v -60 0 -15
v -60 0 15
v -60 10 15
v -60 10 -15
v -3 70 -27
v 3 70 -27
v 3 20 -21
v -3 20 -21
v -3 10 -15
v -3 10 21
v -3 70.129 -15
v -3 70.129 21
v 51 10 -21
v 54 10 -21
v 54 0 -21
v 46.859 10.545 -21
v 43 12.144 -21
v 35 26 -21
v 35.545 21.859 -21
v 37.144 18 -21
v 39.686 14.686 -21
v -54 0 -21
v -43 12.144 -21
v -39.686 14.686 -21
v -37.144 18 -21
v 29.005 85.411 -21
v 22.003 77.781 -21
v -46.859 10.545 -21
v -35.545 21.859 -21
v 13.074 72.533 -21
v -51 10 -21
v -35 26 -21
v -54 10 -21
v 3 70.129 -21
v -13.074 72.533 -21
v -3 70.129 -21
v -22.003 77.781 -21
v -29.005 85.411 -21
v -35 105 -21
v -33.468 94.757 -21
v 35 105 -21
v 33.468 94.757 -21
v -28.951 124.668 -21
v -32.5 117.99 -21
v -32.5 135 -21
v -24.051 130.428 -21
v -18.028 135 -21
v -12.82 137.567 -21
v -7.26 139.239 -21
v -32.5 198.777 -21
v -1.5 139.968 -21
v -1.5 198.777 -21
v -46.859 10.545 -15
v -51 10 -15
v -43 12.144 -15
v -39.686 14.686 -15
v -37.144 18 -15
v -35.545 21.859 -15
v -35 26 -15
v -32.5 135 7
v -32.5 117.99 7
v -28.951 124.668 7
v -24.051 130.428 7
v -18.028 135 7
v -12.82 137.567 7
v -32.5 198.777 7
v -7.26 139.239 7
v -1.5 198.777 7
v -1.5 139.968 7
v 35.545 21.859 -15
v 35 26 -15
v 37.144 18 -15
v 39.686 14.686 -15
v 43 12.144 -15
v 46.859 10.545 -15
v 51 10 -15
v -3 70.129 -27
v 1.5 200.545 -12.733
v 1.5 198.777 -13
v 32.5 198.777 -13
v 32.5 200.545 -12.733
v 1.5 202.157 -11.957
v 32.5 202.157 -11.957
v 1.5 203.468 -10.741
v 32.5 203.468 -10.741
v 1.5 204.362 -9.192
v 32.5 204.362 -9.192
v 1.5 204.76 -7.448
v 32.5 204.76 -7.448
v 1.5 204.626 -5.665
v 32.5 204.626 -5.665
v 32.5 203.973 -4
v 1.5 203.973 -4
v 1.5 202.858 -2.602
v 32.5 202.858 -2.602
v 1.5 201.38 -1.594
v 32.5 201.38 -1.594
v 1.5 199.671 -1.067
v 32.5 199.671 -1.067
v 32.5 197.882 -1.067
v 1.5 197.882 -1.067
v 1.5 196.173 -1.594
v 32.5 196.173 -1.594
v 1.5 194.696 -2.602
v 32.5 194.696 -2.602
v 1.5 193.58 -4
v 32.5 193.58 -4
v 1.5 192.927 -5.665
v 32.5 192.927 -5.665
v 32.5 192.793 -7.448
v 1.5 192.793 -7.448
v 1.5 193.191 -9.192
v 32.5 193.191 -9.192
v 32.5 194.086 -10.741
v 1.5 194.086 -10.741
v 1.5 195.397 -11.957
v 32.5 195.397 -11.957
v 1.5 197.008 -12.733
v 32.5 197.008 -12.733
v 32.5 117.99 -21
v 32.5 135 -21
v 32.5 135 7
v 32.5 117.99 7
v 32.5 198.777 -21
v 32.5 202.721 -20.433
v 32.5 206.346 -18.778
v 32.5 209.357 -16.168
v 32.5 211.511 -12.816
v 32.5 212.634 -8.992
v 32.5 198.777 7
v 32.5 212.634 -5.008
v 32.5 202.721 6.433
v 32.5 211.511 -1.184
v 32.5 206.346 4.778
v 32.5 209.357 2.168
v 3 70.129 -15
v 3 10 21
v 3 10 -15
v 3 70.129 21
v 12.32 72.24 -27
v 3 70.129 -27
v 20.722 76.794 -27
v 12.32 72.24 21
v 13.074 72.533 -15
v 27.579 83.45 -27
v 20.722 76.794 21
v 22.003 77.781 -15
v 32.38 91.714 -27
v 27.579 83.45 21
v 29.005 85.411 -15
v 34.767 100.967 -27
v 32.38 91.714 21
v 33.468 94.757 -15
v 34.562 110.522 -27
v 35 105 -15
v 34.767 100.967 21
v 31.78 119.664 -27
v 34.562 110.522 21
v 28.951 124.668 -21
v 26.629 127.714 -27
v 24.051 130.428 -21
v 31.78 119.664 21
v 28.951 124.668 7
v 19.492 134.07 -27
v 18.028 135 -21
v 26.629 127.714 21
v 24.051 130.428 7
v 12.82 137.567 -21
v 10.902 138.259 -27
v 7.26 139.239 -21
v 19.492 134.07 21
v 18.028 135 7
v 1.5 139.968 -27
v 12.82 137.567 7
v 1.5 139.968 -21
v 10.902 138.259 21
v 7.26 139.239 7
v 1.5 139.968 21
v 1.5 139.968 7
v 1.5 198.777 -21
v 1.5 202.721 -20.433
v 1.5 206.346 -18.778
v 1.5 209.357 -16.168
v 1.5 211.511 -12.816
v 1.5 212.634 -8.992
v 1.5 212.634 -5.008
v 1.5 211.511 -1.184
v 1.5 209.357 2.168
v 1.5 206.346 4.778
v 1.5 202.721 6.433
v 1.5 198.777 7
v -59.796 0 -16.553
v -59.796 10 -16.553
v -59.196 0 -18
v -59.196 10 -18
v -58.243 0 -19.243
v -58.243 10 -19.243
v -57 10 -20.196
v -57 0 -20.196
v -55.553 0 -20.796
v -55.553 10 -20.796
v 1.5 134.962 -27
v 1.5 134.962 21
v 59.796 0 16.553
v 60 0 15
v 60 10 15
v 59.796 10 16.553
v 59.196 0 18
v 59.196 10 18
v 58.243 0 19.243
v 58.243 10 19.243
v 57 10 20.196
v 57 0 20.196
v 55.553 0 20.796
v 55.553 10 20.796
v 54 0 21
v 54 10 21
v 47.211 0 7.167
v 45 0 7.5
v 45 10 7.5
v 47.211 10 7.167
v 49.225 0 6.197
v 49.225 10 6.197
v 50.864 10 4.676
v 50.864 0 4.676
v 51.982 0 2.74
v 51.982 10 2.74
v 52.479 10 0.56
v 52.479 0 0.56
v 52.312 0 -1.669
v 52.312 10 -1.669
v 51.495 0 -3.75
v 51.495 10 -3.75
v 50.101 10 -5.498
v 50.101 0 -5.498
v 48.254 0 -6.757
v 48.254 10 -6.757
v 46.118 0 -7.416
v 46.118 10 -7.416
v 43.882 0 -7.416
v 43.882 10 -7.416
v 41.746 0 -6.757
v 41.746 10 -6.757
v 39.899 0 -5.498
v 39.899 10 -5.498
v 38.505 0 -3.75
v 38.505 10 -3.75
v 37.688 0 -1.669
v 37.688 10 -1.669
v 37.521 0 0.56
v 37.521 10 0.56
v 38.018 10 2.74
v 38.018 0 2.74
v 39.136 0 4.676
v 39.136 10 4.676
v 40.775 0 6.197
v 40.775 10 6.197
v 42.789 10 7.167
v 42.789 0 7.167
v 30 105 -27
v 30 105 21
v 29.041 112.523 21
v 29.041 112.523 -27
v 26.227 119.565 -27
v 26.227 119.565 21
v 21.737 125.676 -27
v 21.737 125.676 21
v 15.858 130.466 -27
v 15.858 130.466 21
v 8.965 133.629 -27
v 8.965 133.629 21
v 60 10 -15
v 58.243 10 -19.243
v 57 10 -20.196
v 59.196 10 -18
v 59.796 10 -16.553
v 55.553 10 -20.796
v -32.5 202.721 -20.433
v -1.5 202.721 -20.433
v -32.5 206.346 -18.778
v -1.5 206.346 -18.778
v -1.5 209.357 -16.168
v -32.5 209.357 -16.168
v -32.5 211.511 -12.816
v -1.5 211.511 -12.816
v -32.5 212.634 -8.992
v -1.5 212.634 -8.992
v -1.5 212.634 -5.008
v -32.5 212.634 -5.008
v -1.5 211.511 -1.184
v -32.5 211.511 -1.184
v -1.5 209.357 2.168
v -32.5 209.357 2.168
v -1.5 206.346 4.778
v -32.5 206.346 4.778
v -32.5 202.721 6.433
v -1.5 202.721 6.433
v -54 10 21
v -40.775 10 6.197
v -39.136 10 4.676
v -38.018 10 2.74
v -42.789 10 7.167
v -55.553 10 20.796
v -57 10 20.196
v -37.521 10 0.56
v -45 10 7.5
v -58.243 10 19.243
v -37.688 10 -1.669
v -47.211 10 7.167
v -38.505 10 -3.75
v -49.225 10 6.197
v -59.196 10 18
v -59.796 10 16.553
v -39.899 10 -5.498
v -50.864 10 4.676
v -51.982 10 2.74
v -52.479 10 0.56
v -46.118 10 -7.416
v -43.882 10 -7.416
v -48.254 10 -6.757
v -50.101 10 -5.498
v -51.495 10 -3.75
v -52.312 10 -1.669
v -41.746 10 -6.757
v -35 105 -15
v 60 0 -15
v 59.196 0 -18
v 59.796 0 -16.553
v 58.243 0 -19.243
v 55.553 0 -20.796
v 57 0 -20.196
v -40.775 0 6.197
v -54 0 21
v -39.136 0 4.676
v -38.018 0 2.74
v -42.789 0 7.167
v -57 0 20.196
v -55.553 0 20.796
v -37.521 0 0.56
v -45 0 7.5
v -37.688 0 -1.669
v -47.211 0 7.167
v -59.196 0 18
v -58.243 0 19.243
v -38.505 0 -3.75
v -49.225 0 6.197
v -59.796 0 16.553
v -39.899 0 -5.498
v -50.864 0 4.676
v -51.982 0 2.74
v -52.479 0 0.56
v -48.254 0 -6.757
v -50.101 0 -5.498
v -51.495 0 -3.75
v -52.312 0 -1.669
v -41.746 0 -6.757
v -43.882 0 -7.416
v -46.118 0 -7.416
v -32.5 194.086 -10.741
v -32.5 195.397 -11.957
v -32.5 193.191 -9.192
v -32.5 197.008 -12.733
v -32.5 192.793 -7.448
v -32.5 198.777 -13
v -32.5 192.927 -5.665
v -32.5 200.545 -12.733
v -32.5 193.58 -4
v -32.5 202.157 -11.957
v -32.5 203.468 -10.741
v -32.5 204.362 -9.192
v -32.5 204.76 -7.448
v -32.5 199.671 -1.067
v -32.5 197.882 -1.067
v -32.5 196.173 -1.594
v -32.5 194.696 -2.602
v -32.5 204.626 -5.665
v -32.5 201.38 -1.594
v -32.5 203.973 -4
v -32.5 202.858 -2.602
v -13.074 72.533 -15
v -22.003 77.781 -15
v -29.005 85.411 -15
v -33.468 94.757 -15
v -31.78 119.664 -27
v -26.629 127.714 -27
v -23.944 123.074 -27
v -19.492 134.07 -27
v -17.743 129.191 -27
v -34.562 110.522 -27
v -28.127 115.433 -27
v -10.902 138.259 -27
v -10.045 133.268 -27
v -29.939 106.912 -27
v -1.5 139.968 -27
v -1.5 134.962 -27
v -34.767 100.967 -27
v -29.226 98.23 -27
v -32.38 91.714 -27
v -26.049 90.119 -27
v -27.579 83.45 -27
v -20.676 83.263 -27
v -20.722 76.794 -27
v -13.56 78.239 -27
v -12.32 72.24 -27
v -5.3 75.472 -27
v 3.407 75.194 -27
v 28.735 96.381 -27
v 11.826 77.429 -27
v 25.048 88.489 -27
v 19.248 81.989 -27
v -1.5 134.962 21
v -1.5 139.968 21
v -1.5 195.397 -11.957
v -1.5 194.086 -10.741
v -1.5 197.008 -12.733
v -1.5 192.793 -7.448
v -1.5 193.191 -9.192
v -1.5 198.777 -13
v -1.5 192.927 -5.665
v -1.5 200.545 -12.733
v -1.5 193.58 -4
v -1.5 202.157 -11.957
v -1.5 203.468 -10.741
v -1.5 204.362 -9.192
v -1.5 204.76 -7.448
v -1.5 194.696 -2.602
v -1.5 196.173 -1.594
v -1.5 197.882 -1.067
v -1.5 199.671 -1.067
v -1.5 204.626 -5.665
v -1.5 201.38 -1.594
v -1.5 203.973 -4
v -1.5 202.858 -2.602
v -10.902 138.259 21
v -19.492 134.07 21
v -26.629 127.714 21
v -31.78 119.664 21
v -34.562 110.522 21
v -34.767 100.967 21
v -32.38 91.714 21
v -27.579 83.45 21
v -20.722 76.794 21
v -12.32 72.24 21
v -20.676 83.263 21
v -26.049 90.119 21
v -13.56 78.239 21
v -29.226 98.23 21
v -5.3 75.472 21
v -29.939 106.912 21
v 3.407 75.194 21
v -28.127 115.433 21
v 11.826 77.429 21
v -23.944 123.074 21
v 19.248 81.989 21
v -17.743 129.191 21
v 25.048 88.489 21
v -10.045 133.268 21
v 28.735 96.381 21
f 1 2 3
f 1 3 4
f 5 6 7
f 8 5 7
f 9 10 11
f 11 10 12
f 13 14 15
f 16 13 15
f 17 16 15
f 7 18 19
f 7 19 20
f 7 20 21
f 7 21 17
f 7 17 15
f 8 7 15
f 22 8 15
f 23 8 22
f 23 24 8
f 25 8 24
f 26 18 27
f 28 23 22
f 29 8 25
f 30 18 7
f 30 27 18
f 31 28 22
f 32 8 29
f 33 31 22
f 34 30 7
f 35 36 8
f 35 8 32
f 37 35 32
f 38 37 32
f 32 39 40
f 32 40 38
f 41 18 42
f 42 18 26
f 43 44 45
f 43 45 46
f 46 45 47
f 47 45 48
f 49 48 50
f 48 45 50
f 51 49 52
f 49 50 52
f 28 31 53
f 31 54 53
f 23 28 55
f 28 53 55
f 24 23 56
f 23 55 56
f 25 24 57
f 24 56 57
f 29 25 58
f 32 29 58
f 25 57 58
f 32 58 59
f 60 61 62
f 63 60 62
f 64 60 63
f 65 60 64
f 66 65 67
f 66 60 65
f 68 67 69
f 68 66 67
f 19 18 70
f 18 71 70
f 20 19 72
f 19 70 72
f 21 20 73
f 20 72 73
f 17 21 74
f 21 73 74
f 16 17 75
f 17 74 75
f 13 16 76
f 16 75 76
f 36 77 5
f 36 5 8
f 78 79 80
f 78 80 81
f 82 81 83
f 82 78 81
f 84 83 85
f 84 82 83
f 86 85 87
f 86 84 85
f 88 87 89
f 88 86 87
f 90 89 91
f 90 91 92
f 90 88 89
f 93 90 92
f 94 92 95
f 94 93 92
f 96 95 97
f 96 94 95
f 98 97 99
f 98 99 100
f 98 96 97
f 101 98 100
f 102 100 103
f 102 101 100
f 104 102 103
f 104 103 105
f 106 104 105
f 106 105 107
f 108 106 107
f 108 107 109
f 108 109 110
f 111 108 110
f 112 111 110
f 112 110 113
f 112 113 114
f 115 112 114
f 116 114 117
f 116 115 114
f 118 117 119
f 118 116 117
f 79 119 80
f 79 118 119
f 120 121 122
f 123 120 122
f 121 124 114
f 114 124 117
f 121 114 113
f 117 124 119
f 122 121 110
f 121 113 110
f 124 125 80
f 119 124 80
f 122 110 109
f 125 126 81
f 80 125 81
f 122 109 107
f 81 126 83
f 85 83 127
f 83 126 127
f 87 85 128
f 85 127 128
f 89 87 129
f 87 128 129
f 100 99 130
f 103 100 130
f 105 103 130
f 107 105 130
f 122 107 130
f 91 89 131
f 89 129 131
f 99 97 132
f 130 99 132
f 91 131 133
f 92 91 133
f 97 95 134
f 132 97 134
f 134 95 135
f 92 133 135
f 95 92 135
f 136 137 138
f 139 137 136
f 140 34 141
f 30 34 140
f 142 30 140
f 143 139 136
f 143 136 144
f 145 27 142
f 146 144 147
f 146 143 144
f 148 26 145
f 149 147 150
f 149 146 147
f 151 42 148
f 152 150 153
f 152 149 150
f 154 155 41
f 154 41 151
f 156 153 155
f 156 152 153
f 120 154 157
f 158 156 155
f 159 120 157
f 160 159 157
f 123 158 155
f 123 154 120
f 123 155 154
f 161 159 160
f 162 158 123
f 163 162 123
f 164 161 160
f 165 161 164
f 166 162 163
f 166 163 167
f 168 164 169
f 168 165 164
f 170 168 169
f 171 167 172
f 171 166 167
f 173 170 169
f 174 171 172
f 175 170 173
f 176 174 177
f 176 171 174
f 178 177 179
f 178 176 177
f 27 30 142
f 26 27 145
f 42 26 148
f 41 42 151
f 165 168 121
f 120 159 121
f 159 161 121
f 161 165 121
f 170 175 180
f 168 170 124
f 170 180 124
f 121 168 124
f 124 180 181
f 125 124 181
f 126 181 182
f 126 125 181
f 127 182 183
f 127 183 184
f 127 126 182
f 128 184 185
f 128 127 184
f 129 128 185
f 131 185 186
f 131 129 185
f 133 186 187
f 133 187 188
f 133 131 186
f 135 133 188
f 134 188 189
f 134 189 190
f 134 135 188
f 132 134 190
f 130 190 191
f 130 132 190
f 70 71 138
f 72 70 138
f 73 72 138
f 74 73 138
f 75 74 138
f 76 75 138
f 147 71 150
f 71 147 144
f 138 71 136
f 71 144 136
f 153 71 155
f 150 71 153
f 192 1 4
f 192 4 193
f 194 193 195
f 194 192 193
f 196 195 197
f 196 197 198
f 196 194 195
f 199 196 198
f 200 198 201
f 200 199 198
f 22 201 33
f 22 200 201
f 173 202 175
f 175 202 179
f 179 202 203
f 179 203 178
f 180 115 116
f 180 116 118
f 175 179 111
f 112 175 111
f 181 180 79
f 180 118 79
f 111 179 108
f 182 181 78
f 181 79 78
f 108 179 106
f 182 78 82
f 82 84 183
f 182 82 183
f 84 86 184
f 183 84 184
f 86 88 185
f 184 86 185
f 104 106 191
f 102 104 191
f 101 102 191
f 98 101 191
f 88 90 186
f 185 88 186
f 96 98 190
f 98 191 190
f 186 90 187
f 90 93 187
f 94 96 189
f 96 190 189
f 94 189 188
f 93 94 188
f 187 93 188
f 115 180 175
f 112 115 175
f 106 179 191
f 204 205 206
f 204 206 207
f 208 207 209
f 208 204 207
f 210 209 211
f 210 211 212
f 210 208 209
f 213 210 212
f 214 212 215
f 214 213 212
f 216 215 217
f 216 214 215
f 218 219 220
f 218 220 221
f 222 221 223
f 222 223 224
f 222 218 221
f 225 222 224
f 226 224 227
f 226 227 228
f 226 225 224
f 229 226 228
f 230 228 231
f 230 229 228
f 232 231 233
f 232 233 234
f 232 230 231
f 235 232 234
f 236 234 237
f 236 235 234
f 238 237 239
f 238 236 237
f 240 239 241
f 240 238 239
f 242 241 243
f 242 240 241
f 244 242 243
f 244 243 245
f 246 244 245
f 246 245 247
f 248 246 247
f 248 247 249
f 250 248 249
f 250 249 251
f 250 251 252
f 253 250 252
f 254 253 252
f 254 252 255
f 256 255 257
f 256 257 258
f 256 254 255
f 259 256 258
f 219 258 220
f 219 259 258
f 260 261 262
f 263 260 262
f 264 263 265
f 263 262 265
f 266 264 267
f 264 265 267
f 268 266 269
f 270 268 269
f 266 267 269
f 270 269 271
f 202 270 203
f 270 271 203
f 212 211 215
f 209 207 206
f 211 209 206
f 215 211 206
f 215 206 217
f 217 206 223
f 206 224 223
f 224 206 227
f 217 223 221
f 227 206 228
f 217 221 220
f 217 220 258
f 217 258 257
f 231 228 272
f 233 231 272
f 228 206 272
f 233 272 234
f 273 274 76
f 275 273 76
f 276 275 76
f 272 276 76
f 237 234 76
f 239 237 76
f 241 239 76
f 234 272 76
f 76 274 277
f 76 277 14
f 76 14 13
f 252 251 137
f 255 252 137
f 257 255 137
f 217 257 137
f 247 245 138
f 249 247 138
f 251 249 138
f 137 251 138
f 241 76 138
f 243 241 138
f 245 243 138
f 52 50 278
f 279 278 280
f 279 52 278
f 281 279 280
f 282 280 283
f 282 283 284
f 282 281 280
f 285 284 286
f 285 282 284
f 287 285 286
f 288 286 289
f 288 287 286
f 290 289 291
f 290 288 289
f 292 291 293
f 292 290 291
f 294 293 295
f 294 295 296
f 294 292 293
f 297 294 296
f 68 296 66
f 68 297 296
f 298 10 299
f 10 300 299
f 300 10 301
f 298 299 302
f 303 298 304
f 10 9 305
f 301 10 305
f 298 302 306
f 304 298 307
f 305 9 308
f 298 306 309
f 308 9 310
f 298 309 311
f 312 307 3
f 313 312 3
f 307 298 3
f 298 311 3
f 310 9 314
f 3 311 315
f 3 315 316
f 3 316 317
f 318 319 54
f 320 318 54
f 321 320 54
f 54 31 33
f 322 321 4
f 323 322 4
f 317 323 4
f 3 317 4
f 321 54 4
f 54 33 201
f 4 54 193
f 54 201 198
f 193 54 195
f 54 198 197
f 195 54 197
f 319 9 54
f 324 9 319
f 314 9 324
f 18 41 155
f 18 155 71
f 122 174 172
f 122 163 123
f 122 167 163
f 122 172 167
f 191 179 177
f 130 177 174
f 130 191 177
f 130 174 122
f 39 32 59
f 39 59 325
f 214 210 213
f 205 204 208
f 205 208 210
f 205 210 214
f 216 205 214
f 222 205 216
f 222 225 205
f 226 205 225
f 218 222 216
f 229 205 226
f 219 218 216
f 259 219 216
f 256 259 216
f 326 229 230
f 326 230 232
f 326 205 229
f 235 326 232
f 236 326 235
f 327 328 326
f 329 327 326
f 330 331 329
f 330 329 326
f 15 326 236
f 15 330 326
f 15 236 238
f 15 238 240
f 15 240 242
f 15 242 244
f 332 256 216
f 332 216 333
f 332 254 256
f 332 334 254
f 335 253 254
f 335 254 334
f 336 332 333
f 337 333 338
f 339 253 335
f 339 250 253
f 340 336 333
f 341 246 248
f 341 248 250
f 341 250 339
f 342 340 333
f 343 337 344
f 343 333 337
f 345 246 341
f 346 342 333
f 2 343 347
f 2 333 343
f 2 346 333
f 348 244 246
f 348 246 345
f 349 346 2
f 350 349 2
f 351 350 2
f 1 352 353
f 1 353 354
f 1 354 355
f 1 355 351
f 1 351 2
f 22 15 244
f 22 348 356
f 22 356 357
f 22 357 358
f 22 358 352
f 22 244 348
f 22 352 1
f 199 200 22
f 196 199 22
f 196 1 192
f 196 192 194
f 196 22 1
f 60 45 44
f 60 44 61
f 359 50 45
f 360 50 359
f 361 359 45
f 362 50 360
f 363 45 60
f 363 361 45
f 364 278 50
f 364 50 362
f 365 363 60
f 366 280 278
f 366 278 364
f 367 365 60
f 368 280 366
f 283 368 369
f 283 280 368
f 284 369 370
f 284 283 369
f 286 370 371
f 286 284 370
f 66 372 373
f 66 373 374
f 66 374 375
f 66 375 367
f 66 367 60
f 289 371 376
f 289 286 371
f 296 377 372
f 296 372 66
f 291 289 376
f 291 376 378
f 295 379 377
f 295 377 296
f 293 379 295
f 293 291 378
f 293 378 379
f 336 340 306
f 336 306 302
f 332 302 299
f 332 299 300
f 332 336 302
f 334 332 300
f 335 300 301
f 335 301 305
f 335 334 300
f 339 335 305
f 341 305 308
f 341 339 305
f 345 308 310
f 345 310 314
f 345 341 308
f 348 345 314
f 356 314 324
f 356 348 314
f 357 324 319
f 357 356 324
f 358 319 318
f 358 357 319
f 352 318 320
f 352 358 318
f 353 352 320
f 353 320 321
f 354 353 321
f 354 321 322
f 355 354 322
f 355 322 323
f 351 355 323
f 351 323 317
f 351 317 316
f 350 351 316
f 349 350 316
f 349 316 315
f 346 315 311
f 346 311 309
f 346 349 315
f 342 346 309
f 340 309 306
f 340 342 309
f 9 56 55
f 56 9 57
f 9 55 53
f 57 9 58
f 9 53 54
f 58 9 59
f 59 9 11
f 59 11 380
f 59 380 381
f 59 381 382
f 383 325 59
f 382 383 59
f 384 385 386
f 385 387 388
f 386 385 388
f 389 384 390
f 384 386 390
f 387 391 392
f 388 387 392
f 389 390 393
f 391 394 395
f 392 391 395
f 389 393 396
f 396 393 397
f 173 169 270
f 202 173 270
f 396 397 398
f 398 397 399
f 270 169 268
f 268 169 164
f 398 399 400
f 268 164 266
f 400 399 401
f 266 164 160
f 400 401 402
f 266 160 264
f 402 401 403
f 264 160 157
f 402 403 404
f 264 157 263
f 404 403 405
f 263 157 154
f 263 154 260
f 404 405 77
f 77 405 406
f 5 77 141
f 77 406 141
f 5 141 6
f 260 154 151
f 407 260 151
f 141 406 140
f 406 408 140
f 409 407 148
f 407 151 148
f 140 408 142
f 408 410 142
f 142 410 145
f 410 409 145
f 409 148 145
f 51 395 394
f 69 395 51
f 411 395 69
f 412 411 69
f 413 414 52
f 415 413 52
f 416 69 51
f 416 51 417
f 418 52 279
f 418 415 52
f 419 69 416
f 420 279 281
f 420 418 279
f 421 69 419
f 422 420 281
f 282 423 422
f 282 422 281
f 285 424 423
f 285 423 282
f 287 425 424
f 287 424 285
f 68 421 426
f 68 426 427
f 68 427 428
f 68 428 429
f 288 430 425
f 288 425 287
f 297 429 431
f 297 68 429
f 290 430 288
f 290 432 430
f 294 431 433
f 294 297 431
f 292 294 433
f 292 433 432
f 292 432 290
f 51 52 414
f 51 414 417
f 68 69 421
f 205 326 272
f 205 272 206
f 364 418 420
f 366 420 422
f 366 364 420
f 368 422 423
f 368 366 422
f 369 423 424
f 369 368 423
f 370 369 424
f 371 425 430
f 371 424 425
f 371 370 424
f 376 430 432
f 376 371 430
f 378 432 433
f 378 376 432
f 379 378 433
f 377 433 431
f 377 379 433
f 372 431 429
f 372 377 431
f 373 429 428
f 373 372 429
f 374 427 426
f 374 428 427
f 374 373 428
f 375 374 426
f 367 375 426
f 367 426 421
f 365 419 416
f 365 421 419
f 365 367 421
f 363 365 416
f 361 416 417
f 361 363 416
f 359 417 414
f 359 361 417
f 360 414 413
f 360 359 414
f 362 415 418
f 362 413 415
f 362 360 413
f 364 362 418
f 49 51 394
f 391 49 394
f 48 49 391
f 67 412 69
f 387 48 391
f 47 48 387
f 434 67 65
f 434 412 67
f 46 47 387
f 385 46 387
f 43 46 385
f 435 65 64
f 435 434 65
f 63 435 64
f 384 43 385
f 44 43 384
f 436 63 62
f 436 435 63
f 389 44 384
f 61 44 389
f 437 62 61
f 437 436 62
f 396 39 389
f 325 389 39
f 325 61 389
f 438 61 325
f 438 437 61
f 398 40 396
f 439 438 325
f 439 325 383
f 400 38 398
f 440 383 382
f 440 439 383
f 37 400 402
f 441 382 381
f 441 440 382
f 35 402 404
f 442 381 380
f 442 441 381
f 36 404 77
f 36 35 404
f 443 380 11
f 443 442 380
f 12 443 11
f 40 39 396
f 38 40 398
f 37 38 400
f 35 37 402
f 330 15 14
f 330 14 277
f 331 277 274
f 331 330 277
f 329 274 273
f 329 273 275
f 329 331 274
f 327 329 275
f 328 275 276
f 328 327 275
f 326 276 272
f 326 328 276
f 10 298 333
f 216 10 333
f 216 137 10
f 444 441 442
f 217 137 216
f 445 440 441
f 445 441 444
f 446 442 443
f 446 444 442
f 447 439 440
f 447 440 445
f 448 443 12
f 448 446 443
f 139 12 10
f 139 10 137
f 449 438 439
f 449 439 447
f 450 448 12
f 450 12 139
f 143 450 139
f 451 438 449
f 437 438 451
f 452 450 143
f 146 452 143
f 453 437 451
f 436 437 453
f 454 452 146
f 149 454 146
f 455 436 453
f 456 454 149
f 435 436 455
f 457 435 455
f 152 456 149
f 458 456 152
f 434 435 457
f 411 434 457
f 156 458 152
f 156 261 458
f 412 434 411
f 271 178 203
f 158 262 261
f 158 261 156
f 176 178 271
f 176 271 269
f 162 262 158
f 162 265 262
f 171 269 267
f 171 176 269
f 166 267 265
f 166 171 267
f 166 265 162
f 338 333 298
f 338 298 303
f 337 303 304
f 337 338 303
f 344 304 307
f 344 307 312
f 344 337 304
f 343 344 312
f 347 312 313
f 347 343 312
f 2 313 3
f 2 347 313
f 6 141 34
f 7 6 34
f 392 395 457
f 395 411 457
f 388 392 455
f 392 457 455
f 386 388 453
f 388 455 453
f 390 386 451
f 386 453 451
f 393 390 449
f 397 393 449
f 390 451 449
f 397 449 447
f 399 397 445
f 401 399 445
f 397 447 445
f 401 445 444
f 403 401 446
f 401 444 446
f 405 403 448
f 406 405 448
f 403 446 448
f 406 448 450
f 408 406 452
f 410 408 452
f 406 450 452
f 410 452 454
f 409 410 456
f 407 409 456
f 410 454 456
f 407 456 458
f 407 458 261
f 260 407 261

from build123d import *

# Parameters (mm, degrees)
SKETCH1_R            = 7.5
BOSS_EXTRUDE1_DEPTH  = 10
SKETCH2_R            = 35
SKETCH2_R_2          = 30
BOSS_EXTRUDE2_DEPTH  = 48
BOSS_EXTRUDE3_DEPTH  = 6
BOSS_EXTRUDE6_DEPTH  = 3
RIB3_REACH           = 161.7
SKETCH5_WALLS_W      = 6
SKETCH5_WALLS_H      = 381.399436442
FILLET1_R            = 16
SKETCH6_R            = 14
SKETCH6_R_2          = 6
BOSS_EXTRUDE7_DEPTH  = 32.5
BOSS_EXTRUDE8_DEPTH  = 32.5
BOSS_EXTRUDE9_REACH  = 152.18
SKETCH8_W            = 14.472243623
SKETCH8_H            = 28
BOSS_EXTRUDE10_REACH = 152.18
SKETCH9_W            = 14.472243623
SKETCH9_H            = 28
SKETCH10_W           = 3
SKETCH10_H           = 122.594000843
CUT_EXTRUDE1_DEPTH   = 32.5


with BuildPart() as part:
    # Sketch1 → Boss-Extrude1 (new body)
    with BuildSketch(Plane(origin=(0, 0, 0), x_dir=(1, 0, 0), z_dir=(0, 1, 0))):
        with BuildLine():
            Line((-54, 21), (54, 21))
            ThreePointArc((54, 21), (58.242640687, 19.242640687), (60, 15))
            Line((60, 15), (60, -15))
            ThreePointArc((60, -15), (58.242640687, -19.242640687), (54, -21))
            Line((54, -21), (-54, -21))
            ThreePointArc((-54, -21), (-58.242640687, -19.242640687), (-60, -15))
            Line((-60, -15), (-60, 15))
            ThreePointArc((-60, 15), (-58.242640687, 19.242640687), (-54, 21))
        make_face()
        with Locations(Location((-45, 0, 0), (0, 0, 270))):
            Circle(SKETCH1_R, mode=Mode.SUBTRACT)
        with Locations(Location((45, 0, 0), (0, 0, 270))):
            Circle(SKETCH1_R, mode=Mode.SUBTRACT)
    extrude(amount=BOSS_EXTRUDE1_DEPTH)



with BuildPart() as body_2:
    # Sketch2 → Boss-Extrude2 (new body)
    with BuildSketch(Plane.XY.offset(21)):
        with Locations((0, 105)):
            Circle(SKETCH2_R)
        with Locations((0, 105)):
            Circle(SKETCH2_R_2, mode=Mode.SUBTRACT)
    extrude(amount=-BOSS_EXTRUDE2_DEPTH)


with BuildPart() as part_1:
    add(part.part)

    add(body_2.part)  # Boss-Extrude3 merges body 2
    # Sketch3 → Boss-Extrude3 (add)
    with BuildSketch(Plane(origin=(0, 0, -21), x_dir=(-1, 0, 0), z_dir=(0, 0, -1))):
        with BuildLine():
            Line((-35, 10), (35, 10))
            Line((35, 10), (35, 105))
            ThreePointArc((35, 105), (0, 70), (-35, 105))
            Line((-35, 105), (-35, 10))
        make_face()
    extrude(amount=-BOSS_EXTRUDE3_DEPTH)

    # Sketch4 → Boss-Extrude6 (add, symmetric)
    with BuildSketch(Plane(origin=(0, 0, 0), x_dir=(0, 0, -1), z_dir=(1, 0, 0))):
        Polygon((27, 70), (21, 20), (21, 70), (21, 73), (27, 73), align=None)
    extrude(amount=BOSS_EXTRUDE6_DEPTH, both=True)

    # Sketch5 walls → Rib3 (add, up to next)
    with BuildSketch(Plane.XY.offset(21), mode=Mode.PRIVATE) as rib3_sk1:
        with Locations((0, 40)):
            Rectangle(SKETCH5_WALLS_W, SKETCH5_WALLS_H)
    rib3_tool1 = extrude(rib3_sk1.sketch, amount=-RIB3_REACH, mode=Mode.PRIVATE) - part_1.part
    add(rib3_tool1.solids().sort_by_distance((0, 40, 21))[0])

    # Fillet1
    fillet1_edges = [part_1.edges().sort_by_distance(p)[0] for p in [
        (-35, 10, -18),
        (35, 10, -18),
    ]]
    fillet(fillet1_edges, radius=FILLET1_R)



with BuildPart() as body_2_2:
    # Sketch6 → Boss-Extrude7 (new, symmetric)
    with BuildSketch(Plane(origin=(0, 0, 0), x_dir=(0, 0, -1), z_dir=(1, 0, 0))):
        with Locations((7, 198.776584802)):
            Circle(SKETCH6_R)
        with Locations((7, 198.776584802)):
            Circle(SKETCH6_R_2, mode=Mode.SUBTRACT)
    extrude(amount=BOSS_EXTRUDE7_DEPTH, both=True)


with BuildPart() as part_2:
    add(part_1.part)

    add(body_2_2.part)  # Boss-Extrude8 merges body 2 2
    # Sketch7 → Boss-Extrude8 (add, symmetric)
    with BuildSketch(Plane(origin=(0, 0, 0), x_dir=(0, 0, -1), z_dir=(1, 0, 0))):
        with BuildLine():
            Line((21, 198.776584802), (21, 140))
            Line((21, 140), (21, 135))
            Line((21, 135), (-7, 135))
            Line((-7, 135), (-7, 140))
            Line((-7, 140), (-7, 198.776584802))
            ThreePointArc((-7, 198.776584802), (7, 184.776584802), (21, 198.776584802))
        make_face()
    extrude(amount=BOSS_EXTRUDE8_DEPTH, both=True)

    # Sketch8 → Boss-Extrude9 (add, up to next)
    with BuildSketch(Plane.XZ.offset(-135), mode=Mode.PRIVATE) as boss_extrude9_sk1:
        with Locations((25.263878189, -7)):
            Rectangle(SKETCH8_W, SKETCH8_H)
    boss_extrude9_tool1 = extrude(boss_extrude9_sk1.sketch, amount=BOSS_EXTRUDE9_REACH, mode=Mode.PRIVATE) - part_2.part
    add(boss_extrude9_tool1.solids().sort_by_distance((25.263878, 135, -7))[0])

    # Sketch9 → Boss-Extrude10 (add, up to next)
    with BuildSketch(Plane.XZ.offset(-135), mode=Mode.PRIVATE) as boss_extrude10_sk1:
        with Locations((-25.263878189, -7)):
            Rectangle(SKETCH9_W, SKETCH9_H)
    boss_extrude10_tool1 = extrude(boss_extrude10_sk1.sketch, amount=BOSS_EXTRUDE10_REACH, mode=Mode.PRIVATE) - part_2.part
    add(boss_extrude10_tool1.solids().sort_by_distance((-25.263878, 135, -7))[0])

    # Sketch10 → Cut-Extrude1 (cut, symmetric)
    with BuildSketch(Plane.XY):
        with Locations((0, 170.584475275)):
            Rectangle(SKETCH10_W, SKETCH10_H)
    extrude(amount=CUT_EXTRUDE1_DEPTH, both=True, mode=Mode.SUBTRACT)


solid = part_2.part
